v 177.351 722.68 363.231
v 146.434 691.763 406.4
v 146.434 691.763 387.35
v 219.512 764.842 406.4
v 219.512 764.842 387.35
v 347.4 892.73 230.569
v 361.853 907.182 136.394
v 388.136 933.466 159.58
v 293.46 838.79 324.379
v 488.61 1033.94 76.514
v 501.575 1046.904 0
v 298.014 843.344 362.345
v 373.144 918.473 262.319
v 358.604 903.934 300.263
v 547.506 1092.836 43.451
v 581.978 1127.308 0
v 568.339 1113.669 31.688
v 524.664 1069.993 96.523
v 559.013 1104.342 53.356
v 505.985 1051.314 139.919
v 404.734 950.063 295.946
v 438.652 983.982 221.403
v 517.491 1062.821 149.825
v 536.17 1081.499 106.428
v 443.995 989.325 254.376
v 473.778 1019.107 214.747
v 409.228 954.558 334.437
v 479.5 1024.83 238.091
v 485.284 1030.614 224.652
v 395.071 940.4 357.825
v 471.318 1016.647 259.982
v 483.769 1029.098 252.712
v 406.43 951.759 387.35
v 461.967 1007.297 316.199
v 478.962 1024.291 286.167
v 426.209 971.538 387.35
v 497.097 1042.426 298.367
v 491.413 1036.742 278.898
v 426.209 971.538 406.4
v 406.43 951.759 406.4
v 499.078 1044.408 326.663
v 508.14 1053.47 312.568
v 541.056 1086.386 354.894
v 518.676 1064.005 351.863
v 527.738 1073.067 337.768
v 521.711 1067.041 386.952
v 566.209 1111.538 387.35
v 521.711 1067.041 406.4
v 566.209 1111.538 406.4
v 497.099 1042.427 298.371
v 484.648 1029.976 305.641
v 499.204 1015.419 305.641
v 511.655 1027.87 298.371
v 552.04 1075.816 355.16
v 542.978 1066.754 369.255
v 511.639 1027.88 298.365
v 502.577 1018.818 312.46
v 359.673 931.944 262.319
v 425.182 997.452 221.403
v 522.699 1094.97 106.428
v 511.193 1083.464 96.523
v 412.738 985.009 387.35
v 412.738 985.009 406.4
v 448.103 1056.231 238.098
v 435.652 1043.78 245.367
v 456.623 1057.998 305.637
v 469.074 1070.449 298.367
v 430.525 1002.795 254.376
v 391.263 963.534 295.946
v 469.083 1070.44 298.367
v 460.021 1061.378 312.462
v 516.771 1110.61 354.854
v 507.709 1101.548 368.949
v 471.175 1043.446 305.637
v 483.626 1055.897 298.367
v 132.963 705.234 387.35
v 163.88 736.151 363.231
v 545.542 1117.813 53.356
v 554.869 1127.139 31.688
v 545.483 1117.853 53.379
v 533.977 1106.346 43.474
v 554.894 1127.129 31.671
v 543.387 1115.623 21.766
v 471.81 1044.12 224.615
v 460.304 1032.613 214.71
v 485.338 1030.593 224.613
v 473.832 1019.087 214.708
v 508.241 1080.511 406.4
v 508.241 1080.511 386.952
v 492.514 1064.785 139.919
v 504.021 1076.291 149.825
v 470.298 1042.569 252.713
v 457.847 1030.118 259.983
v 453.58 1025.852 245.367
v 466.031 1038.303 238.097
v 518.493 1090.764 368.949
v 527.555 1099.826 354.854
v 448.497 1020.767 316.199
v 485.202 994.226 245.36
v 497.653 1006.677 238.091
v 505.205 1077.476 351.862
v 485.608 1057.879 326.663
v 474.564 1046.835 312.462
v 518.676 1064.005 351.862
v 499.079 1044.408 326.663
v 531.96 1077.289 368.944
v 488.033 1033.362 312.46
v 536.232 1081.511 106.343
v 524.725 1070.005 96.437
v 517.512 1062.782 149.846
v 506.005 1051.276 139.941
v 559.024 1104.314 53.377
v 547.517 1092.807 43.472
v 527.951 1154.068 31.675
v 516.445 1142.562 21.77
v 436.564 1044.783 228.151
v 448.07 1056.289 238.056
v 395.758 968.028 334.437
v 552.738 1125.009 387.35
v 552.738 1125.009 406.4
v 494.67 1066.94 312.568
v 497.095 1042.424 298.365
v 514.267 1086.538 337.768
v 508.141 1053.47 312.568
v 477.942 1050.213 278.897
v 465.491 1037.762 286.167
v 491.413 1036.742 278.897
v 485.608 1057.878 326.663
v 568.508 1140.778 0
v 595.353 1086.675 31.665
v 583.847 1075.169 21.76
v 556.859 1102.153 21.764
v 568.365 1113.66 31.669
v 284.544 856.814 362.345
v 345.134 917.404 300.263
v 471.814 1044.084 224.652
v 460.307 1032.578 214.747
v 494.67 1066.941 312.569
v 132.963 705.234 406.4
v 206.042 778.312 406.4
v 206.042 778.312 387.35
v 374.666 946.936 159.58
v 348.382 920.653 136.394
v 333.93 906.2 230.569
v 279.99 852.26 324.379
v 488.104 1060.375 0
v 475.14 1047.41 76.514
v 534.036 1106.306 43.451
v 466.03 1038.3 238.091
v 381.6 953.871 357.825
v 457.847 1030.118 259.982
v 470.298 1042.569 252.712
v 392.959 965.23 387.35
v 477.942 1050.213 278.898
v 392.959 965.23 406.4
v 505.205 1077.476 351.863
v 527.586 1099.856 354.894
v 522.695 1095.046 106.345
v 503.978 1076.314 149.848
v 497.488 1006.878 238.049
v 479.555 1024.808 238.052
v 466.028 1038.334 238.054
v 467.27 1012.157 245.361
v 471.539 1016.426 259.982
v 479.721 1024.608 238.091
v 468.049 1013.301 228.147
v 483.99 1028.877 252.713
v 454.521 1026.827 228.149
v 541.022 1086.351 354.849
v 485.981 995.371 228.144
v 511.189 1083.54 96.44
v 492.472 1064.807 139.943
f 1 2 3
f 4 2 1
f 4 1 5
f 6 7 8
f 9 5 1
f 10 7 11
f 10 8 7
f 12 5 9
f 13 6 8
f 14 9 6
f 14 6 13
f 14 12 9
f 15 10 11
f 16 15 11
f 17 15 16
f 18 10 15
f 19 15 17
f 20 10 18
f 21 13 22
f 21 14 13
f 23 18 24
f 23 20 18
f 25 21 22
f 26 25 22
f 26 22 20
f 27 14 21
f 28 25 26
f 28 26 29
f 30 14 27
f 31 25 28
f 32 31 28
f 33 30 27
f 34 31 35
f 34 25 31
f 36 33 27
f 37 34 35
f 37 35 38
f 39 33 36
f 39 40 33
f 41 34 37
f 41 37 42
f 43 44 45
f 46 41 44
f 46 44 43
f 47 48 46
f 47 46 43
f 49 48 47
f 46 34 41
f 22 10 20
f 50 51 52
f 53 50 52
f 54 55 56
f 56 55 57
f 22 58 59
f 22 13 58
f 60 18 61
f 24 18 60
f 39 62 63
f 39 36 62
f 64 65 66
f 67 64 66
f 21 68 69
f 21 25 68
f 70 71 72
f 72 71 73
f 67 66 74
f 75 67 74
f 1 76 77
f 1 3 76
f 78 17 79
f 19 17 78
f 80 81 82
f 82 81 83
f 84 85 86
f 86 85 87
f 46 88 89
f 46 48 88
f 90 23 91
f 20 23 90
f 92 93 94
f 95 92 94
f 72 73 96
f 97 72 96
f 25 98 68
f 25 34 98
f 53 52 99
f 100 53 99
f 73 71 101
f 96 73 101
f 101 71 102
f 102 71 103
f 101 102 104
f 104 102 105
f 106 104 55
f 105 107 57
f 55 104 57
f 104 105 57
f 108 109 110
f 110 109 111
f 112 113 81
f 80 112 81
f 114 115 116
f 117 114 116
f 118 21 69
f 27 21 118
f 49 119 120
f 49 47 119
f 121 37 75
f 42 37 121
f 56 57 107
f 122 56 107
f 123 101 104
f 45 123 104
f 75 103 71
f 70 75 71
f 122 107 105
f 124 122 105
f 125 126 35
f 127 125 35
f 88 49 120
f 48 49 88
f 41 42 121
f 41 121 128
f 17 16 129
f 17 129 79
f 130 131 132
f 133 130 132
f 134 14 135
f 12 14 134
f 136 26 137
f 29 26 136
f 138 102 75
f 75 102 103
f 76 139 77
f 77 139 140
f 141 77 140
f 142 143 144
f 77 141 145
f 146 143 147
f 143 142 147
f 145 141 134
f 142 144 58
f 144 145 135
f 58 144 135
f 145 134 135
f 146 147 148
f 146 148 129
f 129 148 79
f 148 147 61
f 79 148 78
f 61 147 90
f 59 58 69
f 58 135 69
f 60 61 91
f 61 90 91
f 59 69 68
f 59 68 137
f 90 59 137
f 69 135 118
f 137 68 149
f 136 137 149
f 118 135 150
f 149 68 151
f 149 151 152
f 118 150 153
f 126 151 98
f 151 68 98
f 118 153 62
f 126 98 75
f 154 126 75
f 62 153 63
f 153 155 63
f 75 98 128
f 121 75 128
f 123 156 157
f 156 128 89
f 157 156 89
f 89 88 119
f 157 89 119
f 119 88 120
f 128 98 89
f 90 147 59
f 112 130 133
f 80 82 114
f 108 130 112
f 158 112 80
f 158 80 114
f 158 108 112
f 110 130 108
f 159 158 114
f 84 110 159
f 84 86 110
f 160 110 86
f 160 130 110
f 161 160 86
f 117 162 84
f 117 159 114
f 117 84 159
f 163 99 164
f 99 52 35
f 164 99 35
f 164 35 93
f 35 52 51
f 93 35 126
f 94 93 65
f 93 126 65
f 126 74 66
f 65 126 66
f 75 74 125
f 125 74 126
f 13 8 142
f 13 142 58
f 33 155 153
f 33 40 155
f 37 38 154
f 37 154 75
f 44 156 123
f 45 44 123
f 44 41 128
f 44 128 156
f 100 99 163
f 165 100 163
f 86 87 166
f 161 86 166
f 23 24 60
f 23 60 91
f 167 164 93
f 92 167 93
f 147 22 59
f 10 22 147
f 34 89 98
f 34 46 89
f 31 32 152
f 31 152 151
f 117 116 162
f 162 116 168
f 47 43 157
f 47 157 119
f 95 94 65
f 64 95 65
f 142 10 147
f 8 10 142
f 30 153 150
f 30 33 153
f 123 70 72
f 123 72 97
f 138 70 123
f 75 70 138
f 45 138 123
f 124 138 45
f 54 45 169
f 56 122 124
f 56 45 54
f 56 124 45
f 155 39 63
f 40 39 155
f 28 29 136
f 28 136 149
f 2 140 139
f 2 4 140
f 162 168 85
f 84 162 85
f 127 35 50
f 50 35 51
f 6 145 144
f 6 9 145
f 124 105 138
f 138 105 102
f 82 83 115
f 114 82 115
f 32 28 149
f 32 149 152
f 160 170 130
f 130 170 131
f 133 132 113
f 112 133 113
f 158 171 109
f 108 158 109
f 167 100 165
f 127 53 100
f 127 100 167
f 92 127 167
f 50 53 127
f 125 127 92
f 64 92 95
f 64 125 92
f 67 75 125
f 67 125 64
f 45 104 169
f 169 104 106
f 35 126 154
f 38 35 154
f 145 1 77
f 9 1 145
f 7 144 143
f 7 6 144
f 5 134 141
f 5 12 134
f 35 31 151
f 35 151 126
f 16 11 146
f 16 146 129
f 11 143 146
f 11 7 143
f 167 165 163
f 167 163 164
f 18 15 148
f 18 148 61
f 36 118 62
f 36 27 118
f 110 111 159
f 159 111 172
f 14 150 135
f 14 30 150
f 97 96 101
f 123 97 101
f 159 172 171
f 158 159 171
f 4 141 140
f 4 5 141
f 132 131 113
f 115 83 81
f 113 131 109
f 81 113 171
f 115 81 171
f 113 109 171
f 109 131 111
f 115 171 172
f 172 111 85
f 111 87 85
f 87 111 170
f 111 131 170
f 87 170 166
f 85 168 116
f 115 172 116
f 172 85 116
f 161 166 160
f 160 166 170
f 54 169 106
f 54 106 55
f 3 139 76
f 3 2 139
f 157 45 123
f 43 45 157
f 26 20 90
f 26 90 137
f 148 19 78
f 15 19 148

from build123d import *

# Parameters (mm, degrees)
F4_DEPTH  = 9.525
F7_DEPTH  = 19.05
F10_DEPTH = 19.05
F13_DEPTH = 19.05


with BuildPart() as f4:
    # F3 (on face) → F4 (new body, symmetric)
    with BuildSketch(Plane(origin=(-279.3999947591, 279.3999947591, 0), x_dir=(0.7071067812, 0.7071067812, 0), z_dir=(0.7071067812, -0.7071067812, 0))):
        Polygon((897.3434567451, 136.3937705755), (1094.939827919, 0), (1186.3460540771, 0), (1208.6477168529, 0), (1189.358932348, 31.6884212524), (1176.1695915607, 53.3564214732), (1159.8971501894, 43.4513645921), (1127.5925418344, 96.5227251898), (1143.8649832057, 106.4277820709), (1117.4493271998, 149.8245256533), (1101.1768858285, 139.9194687722), (1055.6292323309, 214.7470573498), (1071.9016737022, 224.6521142309), (1063.7216184457, 238.0906508463), (1069.7582830134, 252.7124149197), (1052.1499304135, 259.9821067094), (1062.9606344033, 286.1673554397), (1080.5689870032, 278.89766365), (1088.6071039683, 298.3672645432), (1104.2253679729, 312.5681619744), (1091.4097280895, 326.662908314), (1119.1245731748, 351.8626150331), (1131.9402130582, 337.7678686935), (1150.7756846557, 354.8940102509), (1186.3460540771, 387.35), (1186.3460540771, 406.4), (1123.4176158905, 406.4), (1123.4176158905, 386.9517445564), (1038.9261245728, 316.1987364292), (1013.5101079941, 254.3757259846), (957.9862356186, 295.9455251694), (964.3420577049, 334.4374001026), (988.3564114571, 387.35), (988.3564114571, 406.4), (960.3846669197, 406.4), (960.3846669197, 387.35), (944.3206191063, 357.8250706196), (892.7488923073, 300.2627193928), (807.0619106293, 362.3449802399), (696.0437893867, 387.35), (696.0437893867, 406.4), (592.6949977875, 406.4), (592.6949977875, 387.35), (636.4180100745, 363.230676916), (800.6214499474, 324.3786394596), (876.9047004259, 230.5688158366), align=None)
        Polygon((934.5138669014, 159.5804095268), (913.3108854294, 262.3189687729), (1005.9539079666, 221.4034497738), (1076.6055583954, 76.5143558383), align=None, mode=Mode.SUBTRACT)
    extrude(amount=F4_DEPTH, both=True)


with BuildPart() as f7:
    # F6 (on offset) → F7 (new body)
    with BuildSketch(Plane(origin=(612.0851783568, 612.0851783568, 526.9035436733), x_dir=(-0.7969782038, 0.4577612549, 0.394056311), z_dir=(0.6040080651, 0.6040080651, 0.5199504924))):
        Polygon((173.4717456385, -502.1336774186), (180.7278261552, -488.1741275421), (158.2275823149, -476.4786515136), (35.4320899302, -684.9516838711), (69.294935102, -702.5533639585), (81.0159557293, -680.0039763552), (98.0058669167, -688.8352183822), (86.1978450266, -711.3393833118), (120.003664876, -728.9114220186), (220.2337926787, -508.7090643073), (197.7017916776, -496.9970811193), (190.445711161, -510.9566309957), align=None)
        Polygon((133.1024890396, -579.797734436), (150.0834169669, -588.6243070246), (126.5987740847, -633.8149402988), (109.6137951094, -624.9862620026), align=None, mode=Mode.SUBTRACT)
    extrude(amount=F7_DEPTH)


with BuildPart() as f10:
    # F9 (on offset) → F10 (new body)
    with BuildSketch(Plane(origin=(570.7938874194, 570.7938874194, -333.2664412264), x_dir=(-0.7568444507, 0.5644310097, -0.3295513811), z_dir=(0.6535950409, 0.6535950409, -0.3816111176))):
        Polygon((131.1431138105, 737.011034934), (149.2344141006, 743.9150810242), (154.8721425753, 729.1420280262), (178.5601790514, 738.1819142142), (150.8513402086, 797.3986505122), (131.6237899899, 790.0609859562), (139.1340680297, 770.3811209167), (121.3348176468, 763.5885276237), (113.822865863, 783.2727785269), (94.5900875045, 775.9331187955), (113.0905681789, 713.1898827074), (136.7832936769, 722.2315583313), align=None)
    extrude(amount=F10_DEPTH)


with BuildPart() as f13:
    # F12 (on offset) → F13 (new body)
    with BuildSketch(Plane(origin=(234.2996544458, 234.2996544458, -364.4211841152), x_dir=(0.8796092674, -0.2572591549, 0.4001315583), z_dir=(0.4756968959, 0.4756968959, -0.7398816976))):
        Polygon((307.9832494259, -1096.6058969498), (323.2985436916, -1085.2743387222), (338.4009601663, -1105.6861786289), (350.927054882, -1096.9924926758), (304.9959647405, -1025.9565364575), (288.4616432104, -1038.1902014502), (301.0194897652, -1055.1626682281), (285.7044041157, -1066.4942264557), (273.1484532493, -1049.5243217817), (256.6150398402, -1061.7573148601), (310.8306977873, -1126.0944195406), (323.090167196, -1117.0238206326), align=None)
    extrude(amount=F13_DEPTH)


solid = Compound([f4.part, f7.part, f10.part, f13.part])
